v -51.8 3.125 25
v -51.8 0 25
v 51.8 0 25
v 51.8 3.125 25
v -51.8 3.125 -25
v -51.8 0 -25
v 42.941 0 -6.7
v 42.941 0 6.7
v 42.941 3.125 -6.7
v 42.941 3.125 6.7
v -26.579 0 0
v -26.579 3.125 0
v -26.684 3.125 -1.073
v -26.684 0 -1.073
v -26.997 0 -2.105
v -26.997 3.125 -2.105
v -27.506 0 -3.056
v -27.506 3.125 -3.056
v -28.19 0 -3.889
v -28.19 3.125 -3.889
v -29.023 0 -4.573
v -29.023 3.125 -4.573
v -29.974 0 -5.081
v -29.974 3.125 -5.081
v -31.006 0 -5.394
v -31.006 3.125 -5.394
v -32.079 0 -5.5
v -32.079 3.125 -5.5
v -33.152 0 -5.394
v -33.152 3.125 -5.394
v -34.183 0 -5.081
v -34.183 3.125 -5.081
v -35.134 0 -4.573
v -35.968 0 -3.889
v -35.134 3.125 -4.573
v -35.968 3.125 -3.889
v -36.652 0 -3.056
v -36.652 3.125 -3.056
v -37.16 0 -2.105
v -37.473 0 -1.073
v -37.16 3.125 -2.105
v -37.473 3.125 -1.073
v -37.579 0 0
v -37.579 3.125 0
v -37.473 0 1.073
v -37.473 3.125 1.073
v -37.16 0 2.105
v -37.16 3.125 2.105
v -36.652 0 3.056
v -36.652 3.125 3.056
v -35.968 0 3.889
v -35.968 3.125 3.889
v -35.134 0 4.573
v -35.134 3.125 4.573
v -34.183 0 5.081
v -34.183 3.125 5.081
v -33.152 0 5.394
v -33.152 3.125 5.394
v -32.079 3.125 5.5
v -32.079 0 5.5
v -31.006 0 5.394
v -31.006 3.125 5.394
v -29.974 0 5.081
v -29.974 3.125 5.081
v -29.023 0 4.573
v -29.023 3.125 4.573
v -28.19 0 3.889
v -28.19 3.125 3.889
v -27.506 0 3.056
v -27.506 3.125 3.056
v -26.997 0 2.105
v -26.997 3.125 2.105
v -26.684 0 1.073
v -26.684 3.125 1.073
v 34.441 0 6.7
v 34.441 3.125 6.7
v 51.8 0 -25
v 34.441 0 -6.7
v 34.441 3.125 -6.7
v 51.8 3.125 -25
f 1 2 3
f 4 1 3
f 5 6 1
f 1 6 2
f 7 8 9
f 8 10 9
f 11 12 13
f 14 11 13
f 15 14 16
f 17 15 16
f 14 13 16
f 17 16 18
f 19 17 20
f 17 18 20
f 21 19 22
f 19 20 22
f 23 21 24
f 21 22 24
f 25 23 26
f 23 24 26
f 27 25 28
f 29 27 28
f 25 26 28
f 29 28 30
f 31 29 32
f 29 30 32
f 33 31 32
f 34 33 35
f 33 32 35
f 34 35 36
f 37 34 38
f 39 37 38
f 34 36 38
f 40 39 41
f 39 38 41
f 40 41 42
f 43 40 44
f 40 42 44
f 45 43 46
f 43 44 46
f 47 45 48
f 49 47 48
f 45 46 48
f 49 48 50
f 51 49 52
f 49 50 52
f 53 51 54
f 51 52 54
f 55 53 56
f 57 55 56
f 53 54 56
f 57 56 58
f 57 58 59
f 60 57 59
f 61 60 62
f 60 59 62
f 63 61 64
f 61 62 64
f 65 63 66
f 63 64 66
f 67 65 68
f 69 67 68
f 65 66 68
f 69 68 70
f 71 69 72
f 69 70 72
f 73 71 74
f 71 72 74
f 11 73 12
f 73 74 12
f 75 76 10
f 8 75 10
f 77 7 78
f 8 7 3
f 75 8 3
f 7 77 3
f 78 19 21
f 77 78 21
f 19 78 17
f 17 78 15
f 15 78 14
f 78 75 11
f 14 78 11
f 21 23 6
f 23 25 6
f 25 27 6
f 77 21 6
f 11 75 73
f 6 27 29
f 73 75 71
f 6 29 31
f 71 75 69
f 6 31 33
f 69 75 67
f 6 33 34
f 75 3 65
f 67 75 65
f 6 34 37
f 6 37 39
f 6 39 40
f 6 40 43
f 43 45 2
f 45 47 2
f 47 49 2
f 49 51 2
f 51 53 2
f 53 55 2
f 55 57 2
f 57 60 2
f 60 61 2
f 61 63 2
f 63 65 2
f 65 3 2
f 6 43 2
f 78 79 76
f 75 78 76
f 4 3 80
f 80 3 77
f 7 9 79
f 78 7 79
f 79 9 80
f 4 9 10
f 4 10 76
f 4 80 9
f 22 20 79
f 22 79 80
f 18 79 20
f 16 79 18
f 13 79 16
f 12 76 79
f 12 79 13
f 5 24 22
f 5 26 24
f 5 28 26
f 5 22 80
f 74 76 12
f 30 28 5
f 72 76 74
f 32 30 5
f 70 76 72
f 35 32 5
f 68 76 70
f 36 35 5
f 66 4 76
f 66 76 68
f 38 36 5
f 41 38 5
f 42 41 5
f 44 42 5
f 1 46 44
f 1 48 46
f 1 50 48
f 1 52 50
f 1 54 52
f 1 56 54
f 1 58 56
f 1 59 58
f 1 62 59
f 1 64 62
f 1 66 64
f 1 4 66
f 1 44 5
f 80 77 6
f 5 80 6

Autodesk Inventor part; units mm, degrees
ref_plane "YZ Plane" through (0, 0, 0) normal (1, 0, 0) x (0, 1, 0)
ref_plane "XZ Plane" through (0, 0, 0) normal (0, 1, 0) x (-1, 0, 0)
ref_plane "XY Plane" through (0, 0, 0) normal (0, 0, 1) x (1, 0, 0)
sketch "Sketch1" plane through (0, 0, 0) normal (0, 1, 0) x (-1, 0, 0)
  line L0 (51.8, 25) -> (-51.8, 25)
  line L1 (-51.8, 25) -> (-51.8, -25)
  line L2 (-51.8, -25) -> (51.8, -25)
  line L3 (51.8, -25) -> (51.8, 25)
  line L4 (51.8, 25) -> (-51.8, -25) construction
  line L5 (-51.8, 25) -> (51.8, -25) construction
  point P0 (0, 0)
  dimension "d0" = 103.6
  dimension "d1" = 50
extrude "Extrusion1" add sketch "Sketch1" along normal blind 3.125
sketch "Sketch2" plane through (0, 3.125, 0) normal (0, 1, 0) x (1, 0, 0)
  circle A0 centre (-32.0787, 0) radius 5.5
  point P0 (0, 0)
  dimension "d4" = 11
extrude "Extrusion2" cut sketch "Sketch2" against normal blind 3.125
sketch "Sketch3" plane through (0, 3.125, 0) normal (0, 1, 0) x (1, 0, 0)
  line L0 (34.4414, -6.7) -> (42.9414, -6.7)
  line L1 (42.9414, -6.7) -> (42.9414, 6.7)
  line L2 (42.9414, 6.7) -> (34.4414, 6.7)
  line L3 (34.4414, 6.7) -> (34.4414, -6.7)
  line L4 (34.4414, -6.7) -> (42.9414, 6.7) construction
  line L5 (42.9414, -6.7) -> (34.4414, 6.7) construction
  point P0 (0, 0)
  point P1 (38.6914, 0)
  dimension "d7" = 8.5
  dimension "d8" = 13.4
extrude "Extrusion3" cut sketch "Sketch3" against normal blind 3.125
properties part number "PARED"
